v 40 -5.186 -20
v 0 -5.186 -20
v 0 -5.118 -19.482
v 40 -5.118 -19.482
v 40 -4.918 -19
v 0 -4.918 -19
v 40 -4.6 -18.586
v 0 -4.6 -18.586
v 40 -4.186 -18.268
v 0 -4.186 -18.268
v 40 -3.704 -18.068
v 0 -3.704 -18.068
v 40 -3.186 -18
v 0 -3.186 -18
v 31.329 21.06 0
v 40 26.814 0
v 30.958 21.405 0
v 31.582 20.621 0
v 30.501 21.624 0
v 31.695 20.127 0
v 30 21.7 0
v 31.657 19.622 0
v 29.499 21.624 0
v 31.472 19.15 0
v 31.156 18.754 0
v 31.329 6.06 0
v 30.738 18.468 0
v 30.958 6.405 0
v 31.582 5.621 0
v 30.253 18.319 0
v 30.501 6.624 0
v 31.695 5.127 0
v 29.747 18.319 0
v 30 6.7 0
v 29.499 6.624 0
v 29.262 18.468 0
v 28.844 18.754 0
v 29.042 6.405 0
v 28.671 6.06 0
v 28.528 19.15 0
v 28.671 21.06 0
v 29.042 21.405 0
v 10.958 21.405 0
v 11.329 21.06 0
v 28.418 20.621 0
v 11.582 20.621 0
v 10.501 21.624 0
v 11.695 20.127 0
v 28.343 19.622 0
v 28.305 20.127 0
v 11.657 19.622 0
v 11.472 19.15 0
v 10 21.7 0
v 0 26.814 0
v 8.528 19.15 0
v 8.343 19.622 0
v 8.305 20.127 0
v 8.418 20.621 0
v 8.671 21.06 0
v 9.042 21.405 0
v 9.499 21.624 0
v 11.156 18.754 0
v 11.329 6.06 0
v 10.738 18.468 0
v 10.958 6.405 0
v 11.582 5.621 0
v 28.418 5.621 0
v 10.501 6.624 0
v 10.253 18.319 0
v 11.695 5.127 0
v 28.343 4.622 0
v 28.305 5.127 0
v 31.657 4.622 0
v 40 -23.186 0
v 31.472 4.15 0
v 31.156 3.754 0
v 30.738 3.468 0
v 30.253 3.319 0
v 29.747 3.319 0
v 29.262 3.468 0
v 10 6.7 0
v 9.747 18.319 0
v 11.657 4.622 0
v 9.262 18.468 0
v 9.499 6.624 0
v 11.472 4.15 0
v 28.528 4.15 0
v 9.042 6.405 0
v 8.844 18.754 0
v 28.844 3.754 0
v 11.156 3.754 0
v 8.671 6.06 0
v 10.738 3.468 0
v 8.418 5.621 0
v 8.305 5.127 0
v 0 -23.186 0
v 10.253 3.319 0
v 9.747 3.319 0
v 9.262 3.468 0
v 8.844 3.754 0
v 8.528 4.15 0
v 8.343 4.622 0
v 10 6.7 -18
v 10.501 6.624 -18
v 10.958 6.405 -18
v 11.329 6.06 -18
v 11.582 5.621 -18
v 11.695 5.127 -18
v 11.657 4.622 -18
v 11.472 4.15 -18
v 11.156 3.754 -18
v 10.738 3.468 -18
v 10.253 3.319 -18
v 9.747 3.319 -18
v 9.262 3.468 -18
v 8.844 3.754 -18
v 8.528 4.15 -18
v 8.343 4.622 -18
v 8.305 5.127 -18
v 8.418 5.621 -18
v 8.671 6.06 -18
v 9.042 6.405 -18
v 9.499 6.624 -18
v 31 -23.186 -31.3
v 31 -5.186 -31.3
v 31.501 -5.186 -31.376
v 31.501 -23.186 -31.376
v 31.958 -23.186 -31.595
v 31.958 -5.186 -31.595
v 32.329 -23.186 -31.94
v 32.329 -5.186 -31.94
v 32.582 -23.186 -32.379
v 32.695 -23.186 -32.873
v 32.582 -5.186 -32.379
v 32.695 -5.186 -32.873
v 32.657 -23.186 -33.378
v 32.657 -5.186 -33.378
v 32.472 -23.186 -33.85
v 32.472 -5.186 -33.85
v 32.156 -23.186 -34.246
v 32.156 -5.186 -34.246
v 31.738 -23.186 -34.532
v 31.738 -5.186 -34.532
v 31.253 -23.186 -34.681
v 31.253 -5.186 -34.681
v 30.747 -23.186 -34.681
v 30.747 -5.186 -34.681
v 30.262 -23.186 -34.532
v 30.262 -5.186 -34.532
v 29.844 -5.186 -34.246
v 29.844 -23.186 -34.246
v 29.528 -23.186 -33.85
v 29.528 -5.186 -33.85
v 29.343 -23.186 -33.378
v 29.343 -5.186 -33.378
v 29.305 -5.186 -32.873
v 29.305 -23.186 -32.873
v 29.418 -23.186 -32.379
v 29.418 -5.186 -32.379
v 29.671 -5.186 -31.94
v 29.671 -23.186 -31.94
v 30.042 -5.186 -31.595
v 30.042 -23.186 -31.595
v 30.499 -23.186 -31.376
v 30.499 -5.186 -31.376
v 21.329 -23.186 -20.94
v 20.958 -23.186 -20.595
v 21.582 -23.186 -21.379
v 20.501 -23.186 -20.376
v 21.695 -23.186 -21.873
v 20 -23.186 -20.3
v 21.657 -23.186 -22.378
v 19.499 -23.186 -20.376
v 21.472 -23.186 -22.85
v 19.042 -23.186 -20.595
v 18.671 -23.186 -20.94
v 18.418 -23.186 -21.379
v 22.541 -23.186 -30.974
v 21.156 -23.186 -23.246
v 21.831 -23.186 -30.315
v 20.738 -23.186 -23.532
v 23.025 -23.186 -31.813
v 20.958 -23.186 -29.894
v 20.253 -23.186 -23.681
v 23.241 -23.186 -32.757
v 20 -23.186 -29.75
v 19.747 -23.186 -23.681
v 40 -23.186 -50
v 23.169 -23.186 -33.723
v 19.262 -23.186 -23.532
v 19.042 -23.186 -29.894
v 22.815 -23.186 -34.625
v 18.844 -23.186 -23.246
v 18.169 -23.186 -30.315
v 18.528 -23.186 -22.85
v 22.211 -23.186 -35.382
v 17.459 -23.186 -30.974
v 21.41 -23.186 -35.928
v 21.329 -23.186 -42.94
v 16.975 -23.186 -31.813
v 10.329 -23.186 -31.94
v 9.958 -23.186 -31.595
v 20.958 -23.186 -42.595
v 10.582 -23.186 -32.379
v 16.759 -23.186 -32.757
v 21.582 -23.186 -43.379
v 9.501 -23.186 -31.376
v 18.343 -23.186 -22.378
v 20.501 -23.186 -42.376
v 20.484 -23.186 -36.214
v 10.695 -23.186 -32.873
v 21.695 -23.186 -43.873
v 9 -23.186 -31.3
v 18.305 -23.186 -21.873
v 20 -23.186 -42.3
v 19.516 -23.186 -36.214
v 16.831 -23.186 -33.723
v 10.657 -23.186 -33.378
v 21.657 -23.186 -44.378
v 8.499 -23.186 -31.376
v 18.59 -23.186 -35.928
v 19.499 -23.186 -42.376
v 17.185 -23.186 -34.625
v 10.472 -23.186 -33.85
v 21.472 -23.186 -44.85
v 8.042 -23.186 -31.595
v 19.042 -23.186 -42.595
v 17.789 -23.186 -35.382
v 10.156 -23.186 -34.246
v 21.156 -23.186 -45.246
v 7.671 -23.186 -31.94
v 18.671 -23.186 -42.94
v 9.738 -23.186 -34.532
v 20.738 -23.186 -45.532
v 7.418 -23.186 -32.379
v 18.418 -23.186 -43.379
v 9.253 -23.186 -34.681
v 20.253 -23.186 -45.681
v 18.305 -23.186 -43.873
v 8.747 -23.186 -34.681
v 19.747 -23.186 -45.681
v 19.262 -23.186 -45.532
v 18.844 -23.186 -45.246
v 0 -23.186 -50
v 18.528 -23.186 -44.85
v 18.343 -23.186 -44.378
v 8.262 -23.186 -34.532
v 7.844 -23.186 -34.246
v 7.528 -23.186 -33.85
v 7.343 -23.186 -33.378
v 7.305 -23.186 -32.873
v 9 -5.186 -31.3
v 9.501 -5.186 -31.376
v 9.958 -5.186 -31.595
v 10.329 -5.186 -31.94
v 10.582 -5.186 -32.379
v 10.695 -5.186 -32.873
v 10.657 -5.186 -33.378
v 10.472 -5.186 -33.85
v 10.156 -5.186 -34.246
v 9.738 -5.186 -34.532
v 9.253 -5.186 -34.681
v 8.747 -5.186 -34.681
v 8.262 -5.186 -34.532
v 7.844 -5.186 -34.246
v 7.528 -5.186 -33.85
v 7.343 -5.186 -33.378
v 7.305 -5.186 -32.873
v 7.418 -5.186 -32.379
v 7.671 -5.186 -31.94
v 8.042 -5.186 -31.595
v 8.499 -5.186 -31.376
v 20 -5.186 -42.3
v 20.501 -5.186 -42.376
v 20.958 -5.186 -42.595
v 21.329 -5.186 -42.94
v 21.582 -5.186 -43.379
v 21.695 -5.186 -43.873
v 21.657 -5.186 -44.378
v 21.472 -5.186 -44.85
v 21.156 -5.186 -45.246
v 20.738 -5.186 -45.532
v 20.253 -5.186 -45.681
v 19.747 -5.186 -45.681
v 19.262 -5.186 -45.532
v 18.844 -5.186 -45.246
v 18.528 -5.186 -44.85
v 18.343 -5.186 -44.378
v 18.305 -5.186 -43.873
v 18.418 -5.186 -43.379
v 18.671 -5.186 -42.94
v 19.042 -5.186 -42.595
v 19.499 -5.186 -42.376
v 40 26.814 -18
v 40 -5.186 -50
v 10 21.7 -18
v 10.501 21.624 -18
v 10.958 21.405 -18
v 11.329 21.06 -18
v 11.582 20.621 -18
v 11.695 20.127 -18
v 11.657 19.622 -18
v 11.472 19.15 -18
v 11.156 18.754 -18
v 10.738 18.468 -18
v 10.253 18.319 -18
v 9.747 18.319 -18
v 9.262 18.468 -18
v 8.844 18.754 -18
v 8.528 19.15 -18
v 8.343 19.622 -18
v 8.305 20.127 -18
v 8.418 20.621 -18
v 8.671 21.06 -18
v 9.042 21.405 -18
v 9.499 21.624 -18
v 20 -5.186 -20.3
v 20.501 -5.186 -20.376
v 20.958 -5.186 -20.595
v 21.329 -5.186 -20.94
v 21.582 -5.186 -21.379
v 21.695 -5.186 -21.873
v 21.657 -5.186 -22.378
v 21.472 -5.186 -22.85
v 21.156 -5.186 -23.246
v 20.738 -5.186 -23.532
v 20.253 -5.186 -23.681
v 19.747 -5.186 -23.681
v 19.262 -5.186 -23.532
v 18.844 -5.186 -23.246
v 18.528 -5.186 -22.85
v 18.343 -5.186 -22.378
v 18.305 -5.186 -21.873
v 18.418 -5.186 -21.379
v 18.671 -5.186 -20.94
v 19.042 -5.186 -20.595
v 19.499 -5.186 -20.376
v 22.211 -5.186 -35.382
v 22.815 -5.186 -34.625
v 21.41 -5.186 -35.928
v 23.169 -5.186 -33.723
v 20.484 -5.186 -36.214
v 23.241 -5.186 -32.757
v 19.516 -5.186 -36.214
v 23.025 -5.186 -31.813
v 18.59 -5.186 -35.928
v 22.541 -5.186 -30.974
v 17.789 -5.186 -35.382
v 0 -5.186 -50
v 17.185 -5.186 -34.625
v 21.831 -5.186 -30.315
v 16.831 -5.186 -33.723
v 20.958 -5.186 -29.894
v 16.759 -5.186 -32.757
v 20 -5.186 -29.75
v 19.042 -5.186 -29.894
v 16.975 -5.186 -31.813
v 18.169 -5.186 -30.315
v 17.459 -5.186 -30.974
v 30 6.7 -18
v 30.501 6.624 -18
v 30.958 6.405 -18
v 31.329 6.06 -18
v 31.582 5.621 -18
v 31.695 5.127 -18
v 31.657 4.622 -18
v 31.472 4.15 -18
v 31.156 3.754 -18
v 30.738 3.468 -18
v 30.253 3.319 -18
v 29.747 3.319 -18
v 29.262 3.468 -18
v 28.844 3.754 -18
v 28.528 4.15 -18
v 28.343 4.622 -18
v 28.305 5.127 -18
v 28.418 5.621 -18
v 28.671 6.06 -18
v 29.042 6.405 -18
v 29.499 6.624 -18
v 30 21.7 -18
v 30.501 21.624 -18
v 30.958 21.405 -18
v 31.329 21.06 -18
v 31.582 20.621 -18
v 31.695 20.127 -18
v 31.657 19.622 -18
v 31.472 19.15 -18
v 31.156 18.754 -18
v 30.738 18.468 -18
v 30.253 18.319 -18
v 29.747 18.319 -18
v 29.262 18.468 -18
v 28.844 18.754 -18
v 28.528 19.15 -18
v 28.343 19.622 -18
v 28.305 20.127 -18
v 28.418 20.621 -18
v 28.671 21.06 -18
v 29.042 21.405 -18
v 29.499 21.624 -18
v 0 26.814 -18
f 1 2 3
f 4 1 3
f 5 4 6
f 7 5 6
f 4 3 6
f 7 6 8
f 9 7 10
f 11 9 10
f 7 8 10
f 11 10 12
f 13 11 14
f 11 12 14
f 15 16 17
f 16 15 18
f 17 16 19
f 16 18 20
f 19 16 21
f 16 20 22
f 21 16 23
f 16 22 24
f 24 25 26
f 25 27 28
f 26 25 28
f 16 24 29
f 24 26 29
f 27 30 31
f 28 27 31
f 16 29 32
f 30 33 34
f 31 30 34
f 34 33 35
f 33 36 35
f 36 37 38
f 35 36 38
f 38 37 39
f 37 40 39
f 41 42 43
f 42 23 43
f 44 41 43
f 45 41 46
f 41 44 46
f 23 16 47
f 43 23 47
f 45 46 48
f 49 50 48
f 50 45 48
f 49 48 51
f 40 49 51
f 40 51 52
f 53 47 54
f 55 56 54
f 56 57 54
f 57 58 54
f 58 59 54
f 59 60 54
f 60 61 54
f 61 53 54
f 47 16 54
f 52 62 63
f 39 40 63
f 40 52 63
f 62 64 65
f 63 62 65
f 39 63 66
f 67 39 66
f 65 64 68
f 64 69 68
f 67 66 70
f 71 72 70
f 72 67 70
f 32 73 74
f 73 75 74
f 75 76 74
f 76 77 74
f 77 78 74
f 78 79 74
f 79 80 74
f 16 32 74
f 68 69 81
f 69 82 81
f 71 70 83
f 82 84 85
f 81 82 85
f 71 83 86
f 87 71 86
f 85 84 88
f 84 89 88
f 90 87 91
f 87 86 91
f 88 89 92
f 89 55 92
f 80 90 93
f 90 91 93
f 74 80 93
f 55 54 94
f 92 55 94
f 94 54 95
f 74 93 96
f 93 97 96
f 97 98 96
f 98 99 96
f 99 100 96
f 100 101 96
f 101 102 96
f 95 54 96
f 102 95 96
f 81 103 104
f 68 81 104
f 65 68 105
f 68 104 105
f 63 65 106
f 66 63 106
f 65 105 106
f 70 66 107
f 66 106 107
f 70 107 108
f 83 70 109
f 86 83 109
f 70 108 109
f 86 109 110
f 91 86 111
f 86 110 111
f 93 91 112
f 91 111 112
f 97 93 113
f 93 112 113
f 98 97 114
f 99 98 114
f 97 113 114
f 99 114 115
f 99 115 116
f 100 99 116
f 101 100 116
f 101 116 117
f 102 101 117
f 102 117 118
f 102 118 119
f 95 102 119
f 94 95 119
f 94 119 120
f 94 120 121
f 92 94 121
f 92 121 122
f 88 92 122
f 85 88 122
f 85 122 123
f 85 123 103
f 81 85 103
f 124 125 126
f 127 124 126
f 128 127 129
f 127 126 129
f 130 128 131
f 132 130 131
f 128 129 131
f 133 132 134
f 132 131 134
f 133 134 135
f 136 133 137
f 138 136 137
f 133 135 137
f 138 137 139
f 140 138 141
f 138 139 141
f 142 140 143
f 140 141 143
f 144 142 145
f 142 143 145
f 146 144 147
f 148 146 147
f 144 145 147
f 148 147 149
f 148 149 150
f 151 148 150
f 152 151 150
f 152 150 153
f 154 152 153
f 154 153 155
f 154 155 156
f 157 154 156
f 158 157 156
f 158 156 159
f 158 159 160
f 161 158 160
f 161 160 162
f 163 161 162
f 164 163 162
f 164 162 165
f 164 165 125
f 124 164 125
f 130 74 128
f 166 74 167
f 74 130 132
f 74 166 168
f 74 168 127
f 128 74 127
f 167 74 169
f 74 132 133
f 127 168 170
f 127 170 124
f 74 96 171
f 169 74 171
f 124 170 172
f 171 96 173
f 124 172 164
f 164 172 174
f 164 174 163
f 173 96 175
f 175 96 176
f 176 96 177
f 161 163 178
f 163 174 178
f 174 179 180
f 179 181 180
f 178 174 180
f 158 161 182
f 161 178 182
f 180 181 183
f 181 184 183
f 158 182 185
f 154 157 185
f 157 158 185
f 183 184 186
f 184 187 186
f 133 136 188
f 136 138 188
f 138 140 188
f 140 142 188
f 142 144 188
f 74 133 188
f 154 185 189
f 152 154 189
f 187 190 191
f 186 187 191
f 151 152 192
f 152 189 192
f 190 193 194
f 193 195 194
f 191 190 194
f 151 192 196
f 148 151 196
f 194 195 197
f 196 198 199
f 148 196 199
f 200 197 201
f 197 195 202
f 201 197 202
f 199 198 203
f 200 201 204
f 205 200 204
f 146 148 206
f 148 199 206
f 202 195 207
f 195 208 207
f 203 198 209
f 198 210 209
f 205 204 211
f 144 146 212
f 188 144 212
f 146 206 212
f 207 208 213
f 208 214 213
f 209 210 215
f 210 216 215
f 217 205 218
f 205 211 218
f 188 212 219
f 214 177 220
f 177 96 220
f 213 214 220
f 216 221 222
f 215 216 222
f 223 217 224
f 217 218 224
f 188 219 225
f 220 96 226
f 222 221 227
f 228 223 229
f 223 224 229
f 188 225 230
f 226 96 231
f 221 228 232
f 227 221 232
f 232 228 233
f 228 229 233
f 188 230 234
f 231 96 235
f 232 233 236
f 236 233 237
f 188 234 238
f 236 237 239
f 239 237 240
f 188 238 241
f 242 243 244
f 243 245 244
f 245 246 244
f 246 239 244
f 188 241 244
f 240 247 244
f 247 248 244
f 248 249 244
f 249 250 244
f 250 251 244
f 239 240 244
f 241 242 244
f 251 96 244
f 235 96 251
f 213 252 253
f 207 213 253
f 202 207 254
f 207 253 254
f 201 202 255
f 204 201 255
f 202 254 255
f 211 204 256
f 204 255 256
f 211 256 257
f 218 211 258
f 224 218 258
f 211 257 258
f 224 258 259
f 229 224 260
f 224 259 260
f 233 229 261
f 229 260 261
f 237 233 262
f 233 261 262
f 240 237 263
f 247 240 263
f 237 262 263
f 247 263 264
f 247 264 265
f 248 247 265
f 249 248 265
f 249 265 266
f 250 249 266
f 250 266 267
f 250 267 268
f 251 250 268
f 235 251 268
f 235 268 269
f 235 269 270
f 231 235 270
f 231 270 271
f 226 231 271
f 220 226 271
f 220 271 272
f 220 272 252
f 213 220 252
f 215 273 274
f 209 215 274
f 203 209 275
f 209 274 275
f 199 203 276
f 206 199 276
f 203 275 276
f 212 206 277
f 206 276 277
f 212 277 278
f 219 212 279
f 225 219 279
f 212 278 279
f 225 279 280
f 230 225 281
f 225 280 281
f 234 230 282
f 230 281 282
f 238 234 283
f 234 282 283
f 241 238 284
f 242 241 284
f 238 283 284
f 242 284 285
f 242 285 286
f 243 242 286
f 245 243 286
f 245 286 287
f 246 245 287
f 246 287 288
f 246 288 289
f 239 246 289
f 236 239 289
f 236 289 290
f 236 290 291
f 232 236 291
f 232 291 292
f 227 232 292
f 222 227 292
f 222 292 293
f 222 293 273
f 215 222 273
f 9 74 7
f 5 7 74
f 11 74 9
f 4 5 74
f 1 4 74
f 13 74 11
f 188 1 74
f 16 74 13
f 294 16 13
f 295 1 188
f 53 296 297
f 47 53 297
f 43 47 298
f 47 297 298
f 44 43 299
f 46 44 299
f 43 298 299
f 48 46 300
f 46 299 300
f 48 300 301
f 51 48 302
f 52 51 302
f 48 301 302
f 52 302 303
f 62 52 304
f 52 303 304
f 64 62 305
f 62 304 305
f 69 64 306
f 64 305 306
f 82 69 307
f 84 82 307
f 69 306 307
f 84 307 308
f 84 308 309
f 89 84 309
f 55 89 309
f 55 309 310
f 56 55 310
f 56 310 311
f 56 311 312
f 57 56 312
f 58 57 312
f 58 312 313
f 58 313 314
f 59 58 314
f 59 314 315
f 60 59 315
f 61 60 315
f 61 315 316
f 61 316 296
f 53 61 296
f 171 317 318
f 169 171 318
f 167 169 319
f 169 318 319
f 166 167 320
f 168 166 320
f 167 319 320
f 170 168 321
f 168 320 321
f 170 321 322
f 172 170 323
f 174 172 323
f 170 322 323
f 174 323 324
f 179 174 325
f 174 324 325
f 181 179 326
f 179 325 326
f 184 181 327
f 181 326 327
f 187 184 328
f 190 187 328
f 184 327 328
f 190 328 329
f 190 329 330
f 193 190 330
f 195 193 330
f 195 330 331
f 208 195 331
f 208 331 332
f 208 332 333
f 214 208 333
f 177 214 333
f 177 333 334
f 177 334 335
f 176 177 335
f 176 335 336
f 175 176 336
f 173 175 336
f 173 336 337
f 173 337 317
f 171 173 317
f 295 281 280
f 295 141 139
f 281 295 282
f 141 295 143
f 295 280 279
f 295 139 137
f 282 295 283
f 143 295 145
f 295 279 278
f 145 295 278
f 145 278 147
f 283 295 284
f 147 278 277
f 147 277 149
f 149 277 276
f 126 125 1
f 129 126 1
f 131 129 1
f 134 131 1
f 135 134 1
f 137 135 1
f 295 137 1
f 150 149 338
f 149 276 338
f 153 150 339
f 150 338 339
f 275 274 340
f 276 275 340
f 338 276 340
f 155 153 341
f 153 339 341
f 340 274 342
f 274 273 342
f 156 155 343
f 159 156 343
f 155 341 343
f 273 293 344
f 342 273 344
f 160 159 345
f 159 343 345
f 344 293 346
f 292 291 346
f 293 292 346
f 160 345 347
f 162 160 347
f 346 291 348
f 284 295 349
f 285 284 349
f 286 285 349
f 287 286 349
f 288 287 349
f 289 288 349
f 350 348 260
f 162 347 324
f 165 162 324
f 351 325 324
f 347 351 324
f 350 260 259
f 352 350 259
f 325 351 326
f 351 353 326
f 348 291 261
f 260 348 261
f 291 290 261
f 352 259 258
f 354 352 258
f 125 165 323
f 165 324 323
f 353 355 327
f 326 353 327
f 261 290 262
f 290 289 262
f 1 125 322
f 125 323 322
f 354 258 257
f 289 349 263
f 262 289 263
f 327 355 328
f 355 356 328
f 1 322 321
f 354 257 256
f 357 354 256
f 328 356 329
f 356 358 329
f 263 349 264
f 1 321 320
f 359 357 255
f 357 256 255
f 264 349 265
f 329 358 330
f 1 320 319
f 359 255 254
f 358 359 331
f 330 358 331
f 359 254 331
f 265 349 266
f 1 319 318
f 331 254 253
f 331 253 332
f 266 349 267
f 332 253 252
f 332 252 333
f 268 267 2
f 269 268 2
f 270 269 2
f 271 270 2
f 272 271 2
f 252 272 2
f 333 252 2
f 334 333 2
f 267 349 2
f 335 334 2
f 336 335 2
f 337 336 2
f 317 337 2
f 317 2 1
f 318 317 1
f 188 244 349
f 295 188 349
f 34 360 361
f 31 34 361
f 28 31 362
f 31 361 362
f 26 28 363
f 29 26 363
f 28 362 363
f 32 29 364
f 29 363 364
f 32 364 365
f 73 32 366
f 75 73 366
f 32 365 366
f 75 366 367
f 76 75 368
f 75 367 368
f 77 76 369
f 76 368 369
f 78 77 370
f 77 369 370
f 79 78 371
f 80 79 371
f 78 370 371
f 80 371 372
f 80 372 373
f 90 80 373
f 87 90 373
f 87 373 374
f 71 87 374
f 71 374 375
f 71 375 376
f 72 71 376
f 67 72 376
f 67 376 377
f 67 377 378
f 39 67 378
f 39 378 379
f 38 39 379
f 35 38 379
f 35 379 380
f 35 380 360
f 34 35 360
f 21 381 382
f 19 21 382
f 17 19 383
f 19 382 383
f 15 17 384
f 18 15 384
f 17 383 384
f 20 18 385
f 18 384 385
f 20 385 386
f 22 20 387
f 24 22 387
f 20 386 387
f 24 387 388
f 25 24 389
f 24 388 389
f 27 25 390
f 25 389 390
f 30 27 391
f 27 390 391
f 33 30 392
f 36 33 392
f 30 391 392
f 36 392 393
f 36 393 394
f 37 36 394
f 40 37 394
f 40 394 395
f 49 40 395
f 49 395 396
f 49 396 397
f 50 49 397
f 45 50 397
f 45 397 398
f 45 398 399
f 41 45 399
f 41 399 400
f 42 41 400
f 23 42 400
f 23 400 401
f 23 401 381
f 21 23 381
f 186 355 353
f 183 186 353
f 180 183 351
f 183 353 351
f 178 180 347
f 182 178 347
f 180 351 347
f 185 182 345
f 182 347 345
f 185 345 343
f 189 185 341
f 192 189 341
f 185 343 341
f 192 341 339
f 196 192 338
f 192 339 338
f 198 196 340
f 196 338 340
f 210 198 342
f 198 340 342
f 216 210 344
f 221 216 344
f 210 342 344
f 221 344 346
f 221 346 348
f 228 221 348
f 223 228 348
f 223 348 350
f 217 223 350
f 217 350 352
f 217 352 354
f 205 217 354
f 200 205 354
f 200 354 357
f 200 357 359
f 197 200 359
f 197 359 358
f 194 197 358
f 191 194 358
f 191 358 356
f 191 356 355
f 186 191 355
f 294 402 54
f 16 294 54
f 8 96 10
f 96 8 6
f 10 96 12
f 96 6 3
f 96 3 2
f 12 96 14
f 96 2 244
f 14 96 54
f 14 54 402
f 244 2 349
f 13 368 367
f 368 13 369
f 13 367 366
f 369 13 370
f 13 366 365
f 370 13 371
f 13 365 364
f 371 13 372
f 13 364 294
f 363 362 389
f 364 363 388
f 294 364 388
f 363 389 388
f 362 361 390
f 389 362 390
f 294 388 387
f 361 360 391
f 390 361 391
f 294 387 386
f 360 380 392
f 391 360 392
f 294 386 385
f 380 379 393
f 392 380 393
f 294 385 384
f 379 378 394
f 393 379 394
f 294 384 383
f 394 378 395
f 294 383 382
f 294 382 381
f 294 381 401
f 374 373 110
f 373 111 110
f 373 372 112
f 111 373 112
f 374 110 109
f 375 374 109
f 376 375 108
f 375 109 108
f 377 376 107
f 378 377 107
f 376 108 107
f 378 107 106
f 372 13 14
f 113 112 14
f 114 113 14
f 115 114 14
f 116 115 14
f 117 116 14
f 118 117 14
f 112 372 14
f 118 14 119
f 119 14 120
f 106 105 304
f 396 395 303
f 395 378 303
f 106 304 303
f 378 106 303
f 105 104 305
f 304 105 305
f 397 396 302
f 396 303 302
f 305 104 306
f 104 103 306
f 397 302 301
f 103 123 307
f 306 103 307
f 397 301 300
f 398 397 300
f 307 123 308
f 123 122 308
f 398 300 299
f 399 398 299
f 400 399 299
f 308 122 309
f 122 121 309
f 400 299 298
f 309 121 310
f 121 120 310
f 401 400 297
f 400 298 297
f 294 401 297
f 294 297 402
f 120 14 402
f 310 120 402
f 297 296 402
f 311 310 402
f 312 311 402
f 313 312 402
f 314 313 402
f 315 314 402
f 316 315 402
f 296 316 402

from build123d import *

# Parameters (mm, degrees)
BOSS_EXTRUDE2_DEPTH = 40
SKETCH6_R           = 3.25
SKETCH6_R_2         = 1.7
CUT_EXTRUDE1_DEPTH  = 72.582120673
SKETCH7_R           = 1.7
CUT_EXTRUDE2_DEPTH  = 58.818545186


with BuildPart() as part:
    # Sketch3 → Boss-Extrude2 (new body)
    with BuildSketch(Plane(origin=(0, 0, 0), x_dir=(0, 0, -1), z_dir=(1, 0, 0))):
        with BuildLine():
            Line((0, -23.186119874), (50, -23.186119874))
            Line((50, -23.186119874), (50, -5.186119874))
            Line((50, -5.186119874), (20, -5.186119874))
            ThreePointArc((20, -5.186119874), (18.585786438, -4.600333436), (18, -3.186119874))
            Line((18, -3.186119874), (18, 26.813880126))
            Line((18, 26.813880126), (0, 26.813880126))
            Line((0, 26.813880126), (0, -23.186119874))
        make_face()
    extrude(amount=BOSS_EXTRUDE2_DEPTH)

    # Sketch6 → Cut-Extrude1 (cut, through all)
    with BuildSketch(Plane(origin=(0, -5.186119874, 0), x_dir=(1, 0, 0), z_dir=(0, 1, 0))):
        with Locations(Location((20, 33, 0), (0, 0, 270))):
            Circle(SKETCH6_R)
        with Locations(Location((9, 33, 0), (0, 0, 270))):
            Circle(SKETCH6_R_2)
        with Locations(Location((20, 44, 0), (0, 0, 270))):
            Circle(SKETCH6_R_2)
        with Locations(Location((31, 33, 0), (0, 0, 270))):
            Circle(SKETCH6_R_2)
        with Locations(Location((20, 22, 0), (0, 0, 270))):
            Circle(SKETCH6_R_2)
    extrude(amount=-CUT_EXTRUDE1_DEPTH, mode=Mode.SUBTRACT)

    # Sketch7 → Cut-Extrude2 (cut, through all)
    with BuildSketch(Plane(origin=(0, 0, -18), x_dir=(-1, 0, 0), z_dir=(0, 0, -1))):
        with Locations(Location((-30, 20, 0), (0, 0, 90))):
            Circle(SKETCH7_R)
        with Locations(Location((-10, 20, 0), (0, 0, 90))):
            Circle(SKETCH7_R)
        with Locations(Location((-30, 5, 0), (0, 0, 90))):
            Circle(SKETCH7_R)
        with Locations(Location((-10, 5, 0), (0, 0, 90))):
            Circle(SKETCH7_R)
    extrude(amount=-CUT_EXTRUDE2_DEPTH, mode=Mode.SUBTRACT)


solid = part.part
